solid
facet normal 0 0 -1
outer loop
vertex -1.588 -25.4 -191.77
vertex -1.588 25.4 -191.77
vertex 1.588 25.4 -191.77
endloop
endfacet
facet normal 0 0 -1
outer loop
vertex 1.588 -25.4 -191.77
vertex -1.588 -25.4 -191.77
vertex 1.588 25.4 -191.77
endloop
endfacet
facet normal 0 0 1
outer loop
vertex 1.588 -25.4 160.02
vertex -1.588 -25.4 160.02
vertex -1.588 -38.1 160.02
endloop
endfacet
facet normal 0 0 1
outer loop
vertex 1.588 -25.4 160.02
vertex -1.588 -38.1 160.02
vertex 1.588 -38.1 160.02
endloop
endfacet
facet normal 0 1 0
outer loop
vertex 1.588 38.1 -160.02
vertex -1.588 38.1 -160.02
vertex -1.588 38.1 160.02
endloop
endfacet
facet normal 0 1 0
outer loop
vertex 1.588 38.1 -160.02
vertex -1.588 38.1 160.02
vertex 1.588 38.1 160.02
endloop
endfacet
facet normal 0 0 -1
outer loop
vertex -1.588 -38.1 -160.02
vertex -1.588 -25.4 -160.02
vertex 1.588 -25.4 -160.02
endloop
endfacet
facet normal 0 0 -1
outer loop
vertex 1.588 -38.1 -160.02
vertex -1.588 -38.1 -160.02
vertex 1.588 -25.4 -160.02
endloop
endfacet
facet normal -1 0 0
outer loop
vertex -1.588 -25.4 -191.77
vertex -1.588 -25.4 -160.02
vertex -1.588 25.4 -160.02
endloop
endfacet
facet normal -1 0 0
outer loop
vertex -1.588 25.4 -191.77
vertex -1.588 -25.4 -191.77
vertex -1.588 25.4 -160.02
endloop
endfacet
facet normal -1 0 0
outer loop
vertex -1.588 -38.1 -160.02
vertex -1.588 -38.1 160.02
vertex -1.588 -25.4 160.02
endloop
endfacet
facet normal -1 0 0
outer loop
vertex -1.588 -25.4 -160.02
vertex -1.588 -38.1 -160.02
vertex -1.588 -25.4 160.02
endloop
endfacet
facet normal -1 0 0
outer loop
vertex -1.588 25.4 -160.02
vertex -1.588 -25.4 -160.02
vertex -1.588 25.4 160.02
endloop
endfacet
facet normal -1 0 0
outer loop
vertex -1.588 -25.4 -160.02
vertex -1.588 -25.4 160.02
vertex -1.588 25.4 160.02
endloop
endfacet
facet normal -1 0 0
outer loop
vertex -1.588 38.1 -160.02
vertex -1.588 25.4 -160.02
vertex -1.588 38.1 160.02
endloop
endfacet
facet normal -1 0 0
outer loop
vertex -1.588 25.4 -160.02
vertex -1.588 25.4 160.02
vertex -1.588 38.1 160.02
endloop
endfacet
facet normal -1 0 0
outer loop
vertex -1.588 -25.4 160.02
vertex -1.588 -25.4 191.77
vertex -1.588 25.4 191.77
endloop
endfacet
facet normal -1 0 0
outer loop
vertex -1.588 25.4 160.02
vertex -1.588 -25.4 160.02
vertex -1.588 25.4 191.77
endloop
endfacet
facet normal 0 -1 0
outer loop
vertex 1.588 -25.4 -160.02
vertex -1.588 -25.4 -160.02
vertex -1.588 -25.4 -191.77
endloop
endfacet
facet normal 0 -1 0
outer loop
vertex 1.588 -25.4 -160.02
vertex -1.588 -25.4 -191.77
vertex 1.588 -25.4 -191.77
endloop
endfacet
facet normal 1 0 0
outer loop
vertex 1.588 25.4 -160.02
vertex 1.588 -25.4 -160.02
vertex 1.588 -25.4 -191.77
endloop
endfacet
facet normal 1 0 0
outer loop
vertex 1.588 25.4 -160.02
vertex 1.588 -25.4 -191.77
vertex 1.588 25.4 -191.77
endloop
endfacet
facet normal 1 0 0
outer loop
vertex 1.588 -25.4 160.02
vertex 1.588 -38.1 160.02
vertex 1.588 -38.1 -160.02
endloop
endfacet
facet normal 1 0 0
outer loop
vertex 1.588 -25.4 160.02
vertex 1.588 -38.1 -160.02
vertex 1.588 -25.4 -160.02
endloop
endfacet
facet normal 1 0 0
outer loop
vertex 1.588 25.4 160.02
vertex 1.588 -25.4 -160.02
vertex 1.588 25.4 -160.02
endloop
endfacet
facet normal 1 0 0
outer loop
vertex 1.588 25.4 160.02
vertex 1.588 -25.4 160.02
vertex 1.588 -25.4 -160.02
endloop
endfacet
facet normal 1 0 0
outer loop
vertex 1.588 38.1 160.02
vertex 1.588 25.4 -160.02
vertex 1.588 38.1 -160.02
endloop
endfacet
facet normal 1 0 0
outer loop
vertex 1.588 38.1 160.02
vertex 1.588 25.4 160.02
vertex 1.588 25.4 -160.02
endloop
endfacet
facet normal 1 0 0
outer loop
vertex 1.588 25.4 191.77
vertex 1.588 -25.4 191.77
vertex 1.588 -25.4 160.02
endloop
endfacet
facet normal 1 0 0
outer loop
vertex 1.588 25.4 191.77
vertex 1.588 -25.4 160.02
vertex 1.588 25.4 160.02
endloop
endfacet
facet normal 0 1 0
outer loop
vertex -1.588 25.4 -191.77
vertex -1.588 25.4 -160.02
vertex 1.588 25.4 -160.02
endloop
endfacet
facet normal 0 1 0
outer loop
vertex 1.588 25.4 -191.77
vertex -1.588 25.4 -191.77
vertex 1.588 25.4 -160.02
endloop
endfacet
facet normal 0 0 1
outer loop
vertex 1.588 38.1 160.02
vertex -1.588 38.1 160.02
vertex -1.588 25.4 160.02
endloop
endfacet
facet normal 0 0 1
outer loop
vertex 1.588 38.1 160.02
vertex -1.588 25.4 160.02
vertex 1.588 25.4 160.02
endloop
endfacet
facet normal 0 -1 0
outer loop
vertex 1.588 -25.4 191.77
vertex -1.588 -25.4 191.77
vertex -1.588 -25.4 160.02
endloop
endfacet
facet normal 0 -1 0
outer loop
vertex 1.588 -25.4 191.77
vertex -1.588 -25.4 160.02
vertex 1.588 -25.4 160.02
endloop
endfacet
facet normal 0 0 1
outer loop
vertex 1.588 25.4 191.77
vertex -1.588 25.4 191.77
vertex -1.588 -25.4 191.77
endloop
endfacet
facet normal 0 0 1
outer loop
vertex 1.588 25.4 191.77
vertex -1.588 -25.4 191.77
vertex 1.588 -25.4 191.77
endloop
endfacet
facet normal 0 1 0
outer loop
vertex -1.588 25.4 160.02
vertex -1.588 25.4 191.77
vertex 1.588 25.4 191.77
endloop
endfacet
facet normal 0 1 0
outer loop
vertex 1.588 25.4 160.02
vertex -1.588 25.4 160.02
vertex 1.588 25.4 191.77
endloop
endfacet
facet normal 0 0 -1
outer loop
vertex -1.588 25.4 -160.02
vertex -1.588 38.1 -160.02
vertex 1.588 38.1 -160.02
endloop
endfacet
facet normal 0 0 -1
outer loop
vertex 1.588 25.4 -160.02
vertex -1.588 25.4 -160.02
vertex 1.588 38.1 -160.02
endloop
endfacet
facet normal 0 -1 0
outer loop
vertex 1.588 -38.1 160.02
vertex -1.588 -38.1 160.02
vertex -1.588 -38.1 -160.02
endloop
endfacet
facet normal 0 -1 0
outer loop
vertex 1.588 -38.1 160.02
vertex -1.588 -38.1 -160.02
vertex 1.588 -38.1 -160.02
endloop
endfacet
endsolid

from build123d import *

# Parameters (mm, degrees)
SKETCH1_W           = 3.175
SKETCH1_H           = 50.8
BOSS_EXTRUDE1_DEPTH = 191.77
SKETCH1_3_W         = 3.175
SKETCH1_3_H         = 12.7
BOSS_EXTRUDE2_DEPTH = 160.02


with BuildPart() as part:
    # Sketch1 → Boss-Extrude1 (new, symmetric)
    with BuildSketch(Plane.XY):
        Rectangle(SKETCH1_W, SKETCH1_H)
    extrude(amount=BOSS_EXTRUDE1_DEPTH, both=True)

    # Sketch1<3> → Boss-Extrude2 (add, symmetric)
    with BuildSketch(Plane.XY):
        with Locations((0, 31.75)):
            Rectangle(SKETCH1_3_W, SKETCH1_3_H)
        with Locations((0, -31.75)):
            Rectangle(SKETCH1_3_W, SKETCH1_3_H)
    extrude(amount=BOSS_EXTRUDE2_DEPTH, both=True)


solid = part.part
